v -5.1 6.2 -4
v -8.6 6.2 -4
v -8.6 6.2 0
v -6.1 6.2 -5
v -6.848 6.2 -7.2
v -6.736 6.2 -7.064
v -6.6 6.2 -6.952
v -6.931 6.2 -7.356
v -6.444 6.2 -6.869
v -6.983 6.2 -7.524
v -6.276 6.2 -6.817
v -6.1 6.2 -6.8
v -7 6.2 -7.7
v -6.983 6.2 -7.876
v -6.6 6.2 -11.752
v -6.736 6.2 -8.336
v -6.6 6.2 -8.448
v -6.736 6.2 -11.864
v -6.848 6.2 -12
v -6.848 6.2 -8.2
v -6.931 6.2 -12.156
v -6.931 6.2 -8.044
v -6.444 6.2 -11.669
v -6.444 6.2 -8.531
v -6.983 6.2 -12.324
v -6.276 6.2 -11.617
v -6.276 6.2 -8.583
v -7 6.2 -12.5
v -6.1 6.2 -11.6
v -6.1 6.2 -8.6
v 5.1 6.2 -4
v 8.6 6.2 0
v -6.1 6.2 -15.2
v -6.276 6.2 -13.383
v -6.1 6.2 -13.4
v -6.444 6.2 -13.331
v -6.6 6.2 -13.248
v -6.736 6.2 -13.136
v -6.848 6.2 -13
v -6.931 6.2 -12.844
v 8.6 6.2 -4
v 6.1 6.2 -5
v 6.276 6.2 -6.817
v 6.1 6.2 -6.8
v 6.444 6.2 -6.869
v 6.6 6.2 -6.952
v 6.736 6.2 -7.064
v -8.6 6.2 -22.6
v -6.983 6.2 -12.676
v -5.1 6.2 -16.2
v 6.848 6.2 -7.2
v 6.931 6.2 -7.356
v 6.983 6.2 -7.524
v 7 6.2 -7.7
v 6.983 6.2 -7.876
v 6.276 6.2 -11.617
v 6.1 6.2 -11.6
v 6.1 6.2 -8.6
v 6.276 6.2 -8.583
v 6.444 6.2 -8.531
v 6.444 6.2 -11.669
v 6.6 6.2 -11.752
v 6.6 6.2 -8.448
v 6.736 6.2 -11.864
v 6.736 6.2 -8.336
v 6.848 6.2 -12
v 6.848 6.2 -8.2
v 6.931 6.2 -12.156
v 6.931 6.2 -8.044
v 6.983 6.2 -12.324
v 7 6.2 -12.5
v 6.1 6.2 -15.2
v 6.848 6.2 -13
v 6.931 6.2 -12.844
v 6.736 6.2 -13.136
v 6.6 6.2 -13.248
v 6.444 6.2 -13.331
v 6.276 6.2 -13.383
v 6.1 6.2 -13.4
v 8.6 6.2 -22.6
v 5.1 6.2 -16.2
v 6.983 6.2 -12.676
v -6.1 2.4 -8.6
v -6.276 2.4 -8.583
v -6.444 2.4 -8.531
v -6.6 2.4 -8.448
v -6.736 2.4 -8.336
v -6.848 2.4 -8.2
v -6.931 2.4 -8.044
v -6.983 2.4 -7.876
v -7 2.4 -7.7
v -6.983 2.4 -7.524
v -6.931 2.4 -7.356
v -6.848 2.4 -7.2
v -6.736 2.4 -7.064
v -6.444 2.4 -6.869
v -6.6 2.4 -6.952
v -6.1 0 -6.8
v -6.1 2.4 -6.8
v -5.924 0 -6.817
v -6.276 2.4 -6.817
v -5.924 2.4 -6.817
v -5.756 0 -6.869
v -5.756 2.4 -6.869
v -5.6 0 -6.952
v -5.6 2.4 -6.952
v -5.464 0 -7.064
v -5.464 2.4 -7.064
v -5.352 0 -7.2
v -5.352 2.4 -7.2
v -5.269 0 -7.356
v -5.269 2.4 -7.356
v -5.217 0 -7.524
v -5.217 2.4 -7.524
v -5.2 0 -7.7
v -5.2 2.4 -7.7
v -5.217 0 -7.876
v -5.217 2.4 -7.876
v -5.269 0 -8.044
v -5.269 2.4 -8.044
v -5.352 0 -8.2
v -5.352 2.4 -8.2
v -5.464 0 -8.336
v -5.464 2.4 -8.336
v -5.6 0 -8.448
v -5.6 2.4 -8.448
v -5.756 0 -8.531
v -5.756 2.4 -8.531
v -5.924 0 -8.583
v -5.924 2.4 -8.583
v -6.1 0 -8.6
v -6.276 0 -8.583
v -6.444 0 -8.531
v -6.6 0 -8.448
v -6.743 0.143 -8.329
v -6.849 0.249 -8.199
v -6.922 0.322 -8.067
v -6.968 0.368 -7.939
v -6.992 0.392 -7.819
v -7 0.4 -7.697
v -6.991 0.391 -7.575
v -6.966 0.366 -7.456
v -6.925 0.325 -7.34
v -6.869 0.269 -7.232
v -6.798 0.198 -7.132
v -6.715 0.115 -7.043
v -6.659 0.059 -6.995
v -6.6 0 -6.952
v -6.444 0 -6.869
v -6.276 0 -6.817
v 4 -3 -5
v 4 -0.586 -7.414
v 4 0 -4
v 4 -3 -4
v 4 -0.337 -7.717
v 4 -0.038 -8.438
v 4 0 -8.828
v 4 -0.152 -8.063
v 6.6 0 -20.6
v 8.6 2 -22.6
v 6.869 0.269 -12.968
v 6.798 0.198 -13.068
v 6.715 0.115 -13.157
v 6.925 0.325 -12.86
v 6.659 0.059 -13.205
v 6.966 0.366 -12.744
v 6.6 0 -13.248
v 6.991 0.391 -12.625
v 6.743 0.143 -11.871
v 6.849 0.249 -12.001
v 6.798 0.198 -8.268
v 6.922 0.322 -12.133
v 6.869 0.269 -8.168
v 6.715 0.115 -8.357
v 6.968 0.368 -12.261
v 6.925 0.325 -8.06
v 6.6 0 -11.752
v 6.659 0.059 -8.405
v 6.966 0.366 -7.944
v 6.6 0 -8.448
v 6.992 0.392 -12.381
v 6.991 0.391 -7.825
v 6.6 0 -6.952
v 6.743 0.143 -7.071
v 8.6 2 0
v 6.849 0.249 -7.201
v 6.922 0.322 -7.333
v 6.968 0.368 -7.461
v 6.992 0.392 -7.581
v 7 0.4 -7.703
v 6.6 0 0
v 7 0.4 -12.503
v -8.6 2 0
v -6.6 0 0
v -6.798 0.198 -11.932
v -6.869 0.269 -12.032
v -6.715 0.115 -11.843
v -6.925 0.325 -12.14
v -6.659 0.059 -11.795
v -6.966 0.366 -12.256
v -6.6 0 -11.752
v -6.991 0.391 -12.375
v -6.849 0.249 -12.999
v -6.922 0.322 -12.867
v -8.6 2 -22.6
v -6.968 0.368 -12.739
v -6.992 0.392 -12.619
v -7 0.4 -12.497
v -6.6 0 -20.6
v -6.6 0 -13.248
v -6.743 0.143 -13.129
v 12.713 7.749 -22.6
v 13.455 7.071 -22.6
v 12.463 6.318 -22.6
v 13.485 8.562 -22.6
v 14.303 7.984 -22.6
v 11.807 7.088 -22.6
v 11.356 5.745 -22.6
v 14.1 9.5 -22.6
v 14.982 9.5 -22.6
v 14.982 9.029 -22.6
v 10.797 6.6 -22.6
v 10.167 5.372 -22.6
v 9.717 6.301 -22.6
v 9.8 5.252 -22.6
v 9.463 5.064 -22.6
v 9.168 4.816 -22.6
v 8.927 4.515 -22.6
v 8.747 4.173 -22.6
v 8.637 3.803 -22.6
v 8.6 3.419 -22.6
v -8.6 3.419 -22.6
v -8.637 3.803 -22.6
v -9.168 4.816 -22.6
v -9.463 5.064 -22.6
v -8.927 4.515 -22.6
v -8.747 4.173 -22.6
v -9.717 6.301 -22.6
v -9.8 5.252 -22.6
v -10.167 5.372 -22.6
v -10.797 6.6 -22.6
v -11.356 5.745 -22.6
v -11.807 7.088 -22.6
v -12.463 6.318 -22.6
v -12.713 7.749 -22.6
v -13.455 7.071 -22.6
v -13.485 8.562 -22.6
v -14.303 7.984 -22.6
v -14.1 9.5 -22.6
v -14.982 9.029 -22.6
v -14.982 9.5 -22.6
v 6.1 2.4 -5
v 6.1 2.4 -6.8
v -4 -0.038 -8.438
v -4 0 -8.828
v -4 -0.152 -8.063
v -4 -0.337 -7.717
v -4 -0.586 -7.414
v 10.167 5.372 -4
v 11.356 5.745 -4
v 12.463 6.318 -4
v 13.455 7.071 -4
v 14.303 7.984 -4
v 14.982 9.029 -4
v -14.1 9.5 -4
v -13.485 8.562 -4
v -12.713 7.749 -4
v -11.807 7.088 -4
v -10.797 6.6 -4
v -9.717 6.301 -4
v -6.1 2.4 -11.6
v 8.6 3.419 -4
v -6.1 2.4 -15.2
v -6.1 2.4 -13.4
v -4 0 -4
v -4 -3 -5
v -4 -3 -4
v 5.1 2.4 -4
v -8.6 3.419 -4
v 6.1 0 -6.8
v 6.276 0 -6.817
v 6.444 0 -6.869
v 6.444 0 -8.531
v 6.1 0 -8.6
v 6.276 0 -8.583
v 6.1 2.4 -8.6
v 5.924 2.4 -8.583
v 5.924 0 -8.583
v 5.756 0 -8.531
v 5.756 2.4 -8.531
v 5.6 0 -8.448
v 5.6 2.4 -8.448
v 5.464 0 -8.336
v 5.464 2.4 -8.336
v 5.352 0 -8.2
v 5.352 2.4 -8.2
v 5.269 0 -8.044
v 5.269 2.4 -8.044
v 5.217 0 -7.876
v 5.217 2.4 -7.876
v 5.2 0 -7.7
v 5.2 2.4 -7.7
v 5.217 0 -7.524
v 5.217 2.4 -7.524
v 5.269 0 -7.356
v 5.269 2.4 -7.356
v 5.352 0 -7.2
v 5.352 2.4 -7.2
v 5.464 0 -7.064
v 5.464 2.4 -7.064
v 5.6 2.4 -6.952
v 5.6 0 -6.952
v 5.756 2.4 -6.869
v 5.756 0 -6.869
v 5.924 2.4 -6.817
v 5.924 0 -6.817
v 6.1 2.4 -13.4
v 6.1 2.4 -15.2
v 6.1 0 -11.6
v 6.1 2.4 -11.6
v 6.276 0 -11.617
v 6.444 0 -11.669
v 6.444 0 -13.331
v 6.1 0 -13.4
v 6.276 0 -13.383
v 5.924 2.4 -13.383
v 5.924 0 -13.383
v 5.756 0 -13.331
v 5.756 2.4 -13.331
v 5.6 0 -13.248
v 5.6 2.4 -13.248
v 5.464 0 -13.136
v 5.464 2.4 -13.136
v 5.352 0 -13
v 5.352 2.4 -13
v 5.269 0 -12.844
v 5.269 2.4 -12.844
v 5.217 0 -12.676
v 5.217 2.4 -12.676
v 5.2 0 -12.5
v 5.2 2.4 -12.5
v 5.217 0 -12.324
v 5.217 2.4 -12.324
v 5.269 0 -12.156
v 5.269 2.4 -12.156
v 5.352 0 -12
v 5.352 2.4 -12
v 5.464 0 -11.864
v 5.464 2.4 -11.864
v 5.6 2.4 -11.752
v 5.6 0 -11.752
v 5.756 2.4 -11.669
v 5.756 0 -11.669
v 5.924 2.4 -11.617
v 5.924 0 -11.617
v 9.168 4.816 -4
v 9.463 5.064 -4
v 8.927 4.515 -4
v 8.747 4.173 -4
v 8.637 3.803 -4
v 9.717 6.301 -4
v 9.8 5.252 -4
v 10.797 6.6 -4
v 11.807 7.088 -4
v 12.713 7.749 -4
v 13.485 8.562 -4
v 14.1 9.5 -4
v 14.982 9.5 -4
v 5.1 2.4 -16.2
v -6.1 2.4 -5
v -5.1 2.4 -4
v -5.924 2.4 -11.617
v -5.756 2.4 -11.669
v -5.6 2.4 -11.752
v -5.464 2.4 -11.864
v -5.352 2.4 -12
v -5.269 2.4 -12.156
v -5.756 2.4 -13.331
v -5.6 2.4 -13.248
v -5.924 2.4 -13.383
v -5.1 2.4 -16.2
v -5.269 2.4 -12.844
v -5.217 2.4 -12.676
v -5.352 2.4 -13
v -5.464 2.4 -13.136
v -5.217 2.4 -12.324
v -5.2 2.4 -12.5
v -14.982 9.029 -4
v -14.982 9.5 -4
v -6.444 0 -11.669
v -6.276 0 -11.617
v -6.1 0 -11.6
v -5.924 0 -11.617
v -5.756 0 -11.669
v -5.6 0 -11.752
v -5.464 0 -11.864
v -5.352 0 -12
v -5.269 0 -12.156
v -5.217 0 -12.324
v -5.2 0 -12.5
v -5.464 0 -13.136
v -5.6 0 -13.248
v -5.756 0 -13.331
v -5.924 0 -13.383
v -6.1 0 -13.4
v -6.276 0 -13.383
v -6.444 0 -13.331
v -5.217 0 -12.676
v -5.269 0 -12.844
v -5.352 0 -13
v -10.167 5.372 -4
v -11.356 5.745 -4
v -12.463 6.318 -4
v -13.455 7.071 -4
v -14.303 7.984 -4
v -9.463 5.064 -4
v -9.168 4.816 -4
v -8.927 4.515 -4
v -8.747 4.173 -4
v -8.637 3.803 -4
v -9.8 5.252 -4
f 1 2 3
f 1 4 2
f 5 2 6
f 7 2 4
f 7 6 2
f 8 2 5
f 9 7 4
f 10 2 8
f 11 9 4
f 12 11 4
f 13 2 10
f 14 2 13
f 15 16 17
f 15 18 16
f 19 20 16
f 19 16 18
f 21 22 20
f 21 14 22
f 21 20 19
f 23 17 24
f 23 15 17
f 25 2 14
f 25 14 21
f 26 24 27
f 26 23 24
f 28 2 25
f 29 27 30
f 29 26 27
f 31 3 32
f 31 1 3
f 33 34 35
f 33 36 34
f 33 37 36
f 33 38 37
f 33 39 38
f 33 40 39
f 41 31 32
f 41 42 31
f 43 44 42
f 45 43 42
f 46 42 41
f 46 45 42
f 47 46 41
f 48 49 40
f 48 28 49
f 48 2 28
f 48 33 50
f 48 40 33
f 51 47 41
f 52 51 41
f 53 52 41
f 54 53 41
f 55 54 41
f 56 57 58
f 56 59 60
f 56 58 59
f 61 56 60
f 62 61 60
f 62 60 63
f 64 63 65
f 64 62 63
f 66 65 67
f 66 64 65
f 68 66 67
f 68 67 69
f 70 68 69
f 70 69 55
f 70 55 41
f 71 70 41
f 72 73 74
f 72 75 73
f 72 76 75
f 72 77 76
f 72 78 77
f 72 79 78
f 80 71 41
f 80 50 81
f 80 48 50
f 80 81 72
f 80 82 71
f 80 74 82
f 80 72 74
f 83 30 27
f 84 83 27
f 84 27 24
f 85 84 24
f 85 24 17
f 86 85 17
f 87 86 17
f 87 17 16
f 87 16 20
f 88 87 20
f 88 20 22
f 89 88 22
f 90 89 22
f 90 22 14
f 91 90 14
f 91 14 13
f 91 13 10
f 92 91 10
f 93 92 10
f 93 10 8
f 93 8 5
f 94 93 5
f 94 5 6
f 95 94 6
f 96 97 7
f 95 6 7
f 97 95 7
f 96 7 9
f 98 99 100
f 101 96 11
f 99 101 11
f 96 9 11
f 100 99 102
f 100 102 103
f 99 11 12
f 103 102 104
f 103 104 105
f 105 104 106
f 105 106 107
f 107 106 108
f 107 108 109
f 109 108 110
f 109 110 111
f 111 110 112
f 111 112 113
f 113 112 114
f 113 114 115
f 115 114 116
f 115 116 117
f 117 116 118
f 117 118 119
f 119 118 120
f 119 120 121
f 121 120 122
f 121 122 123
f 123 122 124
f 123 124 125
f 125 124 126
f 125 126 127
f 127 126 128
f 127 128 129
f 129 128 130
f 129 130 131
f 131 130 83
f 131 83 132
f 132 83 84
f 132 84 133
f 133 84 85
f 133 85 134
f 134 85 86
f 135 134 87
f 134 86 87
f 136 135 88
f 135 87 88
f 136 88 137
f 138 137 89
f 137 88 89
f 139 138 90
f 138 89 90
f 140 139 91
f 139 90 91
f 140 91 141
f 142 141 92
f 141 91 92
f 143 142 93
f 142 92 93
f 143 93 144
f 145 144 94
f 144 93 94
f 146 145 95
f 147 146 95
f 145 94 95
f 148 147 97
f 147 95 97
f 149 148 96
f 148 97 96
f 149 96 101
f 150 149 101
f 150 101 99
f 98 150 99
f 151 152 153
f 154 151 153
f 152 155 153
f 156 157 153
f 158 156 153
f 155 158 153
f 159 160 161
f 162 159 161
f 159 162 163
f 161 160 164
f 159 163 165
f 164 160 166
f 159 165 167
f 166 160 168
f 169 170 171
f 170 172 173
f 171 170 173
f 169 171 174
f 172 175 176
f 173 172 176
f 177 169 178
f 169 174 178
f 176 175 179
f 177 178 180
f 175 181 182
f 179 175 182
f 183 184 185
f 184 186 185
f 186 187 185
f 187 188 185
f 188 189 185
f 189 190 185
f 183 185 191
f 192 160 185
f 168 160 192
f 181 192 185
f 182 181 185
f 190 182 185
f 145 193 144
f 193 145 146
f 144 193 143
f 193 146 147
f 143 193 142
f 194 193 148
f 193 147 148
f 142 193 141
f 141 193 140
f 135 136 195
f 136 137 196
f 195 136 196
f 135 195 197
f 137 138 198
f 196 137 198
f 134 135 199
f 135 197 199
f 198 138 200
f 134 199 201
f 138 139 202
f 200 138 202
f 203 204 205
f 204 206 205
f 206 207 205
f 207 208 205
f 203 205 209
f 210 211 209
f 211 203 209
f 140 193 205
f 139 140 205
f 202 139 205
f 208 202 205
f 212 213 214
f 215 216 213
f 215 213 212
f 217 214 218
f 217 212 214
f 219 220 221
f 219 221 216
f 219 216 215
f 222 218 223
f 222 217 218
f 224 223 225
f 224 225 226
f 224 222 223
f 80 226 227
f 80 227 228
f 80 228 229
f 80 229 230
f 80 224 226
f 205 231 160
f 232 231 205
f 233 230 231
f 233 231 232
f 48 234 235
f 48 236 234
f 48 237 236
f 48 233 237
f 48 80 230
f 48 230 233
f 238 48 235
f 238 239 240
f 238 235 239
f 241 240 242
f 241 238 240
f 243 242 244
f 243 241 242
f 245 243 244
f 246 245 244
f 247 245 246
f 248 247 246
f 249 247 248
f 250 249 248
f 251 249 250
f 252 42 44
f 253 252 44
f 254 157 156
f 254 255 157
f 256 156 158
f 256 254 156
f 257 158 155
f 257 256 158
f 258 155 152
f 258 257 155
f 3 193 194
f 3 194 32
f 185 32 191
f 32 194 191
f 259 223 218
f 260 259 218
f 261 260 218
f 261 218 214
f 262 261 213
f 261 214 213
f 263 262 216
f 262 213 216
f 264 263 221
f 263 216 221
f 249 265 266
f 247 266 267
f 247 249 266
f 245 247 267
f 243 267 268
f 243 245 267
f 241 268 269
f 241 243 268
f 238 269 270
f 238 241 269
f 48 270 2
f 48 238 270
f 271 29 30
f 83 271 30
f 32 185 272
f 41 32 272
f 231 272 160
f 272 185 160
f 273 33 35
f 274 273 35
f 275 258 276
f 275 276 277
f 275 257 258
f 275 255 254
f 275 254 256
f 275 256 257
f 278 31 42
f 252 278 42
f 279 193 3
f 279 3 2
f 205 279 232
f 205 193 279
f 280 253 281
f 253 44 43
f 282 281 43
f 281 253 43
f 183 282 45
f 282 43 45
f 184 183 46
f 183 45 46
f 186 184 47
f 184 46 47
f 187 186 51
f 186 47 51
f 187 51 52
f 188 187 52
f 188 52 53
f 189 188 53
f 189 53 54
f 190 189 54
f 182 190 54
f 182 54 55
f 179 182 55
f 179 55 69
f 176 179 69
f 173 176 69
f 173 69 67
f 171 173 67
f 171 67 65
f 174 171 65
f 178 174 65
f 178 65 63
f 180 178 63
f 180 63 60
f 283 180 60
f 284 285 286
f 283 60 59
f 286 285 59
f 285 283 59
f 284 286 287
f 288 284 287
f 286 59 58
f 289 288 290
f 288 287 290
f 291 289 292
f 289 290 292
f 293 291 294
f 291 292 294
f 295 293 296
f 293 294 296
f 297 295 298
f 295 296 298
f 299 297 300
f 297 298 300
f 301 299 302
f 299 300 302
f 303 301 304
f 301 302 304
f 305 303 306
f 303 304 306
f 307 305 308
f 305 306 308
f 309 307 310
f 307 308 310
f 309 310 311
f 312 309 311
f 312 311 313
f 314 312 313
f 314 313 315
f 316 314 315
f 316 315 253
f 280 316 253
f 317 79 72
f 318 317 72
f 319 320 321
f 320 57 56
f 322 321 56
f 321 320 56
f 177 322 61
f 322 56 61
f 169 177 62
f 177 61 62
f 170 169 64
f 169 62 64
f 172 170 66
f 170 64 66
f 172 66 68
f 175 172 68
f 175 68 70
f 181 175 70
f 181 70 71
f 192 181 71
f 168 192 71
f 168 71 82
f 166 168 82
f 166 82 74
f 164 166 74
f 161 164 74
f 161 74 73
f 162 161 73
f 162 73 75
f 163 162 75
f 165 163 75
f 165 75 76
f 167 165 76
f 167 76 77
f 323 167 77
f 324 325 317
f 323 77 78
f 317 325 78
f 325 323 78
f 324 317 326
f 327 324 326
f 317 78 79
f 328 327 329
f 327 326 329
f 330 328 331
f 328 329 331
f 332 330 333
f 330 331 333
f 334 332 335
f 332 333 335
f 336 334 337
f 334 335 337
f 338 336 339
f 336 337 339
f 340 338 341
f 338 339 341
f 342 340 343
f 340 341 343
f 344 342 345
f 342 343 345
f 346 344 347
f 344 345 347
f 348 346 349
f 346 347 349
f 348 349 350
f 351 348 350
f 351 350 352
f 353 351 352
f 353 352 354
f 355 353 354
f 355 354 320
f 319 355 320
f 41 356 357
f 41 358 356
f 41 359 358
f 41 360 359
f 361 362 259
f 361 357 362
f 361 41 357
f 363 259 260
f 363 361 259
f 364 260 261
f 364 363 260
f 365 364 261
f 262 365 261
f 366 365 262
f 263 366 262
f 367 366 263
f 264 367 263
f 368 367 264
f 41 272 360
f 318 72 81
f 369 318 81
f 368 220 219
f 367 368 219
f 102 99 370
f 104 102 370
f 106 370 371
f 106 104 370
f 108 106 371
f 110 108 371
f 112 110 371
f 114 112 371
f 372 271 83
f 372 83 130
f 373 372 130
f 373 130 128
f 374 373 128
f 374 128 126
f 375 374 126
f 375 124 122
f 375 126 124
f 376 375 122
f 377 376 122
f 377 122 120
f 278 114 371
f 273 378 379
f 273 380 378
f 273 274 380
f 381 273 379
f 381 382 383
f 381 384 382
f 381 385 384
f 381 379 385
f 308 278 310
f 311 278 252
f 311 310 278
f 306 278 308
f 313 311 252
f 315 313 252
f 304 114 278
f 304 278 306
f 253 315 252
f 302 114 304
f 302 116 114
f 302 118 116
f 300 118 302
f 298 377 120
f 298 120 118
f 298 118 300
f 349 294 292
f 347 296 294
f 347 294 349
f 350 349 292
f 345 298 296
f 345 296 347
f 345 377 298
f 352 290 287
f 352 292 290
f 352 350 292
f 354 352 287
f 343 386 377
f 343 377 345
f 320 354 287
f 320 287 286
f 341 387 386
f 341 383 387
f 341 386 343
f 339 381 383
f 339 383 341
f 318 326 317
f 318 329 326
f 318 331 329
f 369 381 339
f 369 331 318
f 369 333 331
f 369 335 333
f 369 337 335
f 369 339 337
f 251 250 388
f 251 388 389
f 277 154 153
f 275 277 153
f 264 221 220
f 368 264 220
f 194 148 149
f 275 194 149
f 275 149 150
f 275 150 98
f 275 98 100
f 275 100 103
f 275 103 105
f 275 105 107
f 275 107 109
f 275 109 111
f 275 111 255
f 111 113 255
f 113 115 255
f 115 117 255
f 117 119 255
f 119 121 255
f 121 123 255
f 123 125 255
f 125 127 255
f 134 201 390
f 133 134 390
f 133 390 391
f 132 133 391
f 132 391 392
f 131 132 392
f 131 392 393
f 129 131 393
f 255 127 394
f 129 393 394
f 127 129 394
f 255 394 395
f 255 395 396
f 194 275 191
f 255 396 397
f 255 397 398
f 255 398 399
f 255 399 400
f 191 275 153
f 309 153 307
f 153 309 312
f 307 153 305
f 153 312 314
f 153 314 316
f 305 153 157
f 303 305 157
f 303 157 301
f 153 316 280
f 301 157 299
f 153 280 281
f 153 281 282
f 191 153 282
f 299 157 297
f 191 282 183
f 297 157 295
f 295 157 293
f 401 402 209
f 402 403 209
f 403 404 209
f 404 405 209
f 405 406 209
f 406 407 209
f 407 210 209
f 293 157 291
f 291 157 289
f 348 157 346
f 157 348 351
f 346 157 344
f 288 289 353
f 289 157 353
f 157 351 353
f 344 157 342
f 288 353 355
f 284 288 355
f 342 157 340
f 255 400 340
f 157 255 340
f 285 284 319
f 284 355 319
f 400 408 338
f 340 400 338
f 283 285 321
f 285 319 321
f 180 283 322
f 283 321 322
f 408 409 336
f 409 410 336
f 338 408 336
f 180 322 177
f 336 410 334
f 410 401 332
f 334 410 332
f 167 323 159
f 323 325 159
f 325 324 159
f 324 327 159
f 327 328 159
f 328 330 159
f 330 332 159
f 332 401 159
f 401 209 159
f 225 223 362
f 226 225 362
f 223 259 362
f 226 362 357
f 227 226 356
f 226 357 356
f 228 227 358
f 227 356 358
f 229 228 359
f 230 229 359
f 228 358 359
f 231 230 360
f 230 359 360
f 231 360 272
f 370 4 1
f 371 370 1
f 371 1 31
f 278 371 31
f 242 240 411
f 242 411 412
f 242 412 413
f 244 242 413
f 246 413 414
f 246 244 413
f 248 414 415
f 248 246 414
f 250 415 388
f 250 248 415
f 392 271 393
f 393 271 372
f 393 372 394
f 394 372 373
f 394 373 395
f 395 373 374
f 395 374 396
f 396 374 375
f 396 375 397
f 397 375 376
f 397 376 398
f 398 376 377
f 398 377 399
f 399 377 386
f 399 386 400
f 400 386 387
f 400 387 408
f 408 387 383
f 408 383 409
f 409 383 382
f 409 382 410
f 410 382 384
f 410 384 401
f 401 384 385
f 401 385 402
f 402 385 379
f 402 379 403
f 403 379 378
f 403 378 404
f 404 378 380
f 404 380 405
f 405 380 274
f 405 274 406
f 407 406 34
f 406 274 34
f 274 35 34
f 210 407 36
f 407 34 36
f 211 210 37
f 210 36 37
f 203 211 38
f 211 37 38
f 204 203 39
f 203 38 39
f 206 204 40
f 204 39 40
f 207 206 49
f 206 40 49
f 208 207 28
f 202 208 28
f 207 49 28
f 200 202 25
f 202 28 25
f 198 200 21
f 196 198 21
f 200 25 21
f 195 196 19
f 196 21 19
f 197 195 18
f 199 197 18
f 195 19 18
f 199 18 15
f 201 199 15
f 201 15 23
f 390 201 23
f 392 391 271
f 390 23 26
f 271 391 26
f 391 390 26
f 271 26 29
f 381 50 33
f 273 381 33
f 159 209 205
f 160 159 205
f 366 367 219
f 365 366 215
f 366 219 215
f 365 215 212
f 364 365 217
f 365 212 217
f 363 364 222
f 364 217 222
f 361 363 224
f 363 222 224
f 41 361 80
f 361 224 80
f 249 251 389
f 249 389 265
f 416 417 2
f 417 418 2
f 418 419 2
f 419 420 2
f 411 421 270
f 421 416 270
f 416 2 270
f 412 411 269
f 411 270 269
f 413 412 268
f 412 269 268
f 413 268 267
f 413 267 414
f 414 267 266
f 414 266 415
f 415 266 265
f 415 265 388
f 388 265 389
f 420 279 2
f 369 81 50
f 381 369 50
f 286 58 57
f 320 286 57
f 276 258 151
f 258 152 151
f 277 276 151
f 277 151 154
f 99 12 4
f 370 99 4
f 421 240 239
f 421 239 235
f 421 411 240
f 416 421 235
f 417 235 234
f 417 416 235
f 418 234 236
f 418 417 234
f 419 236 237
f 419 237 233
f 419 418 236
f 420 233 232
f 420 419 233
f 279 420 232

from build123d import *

# Parameters (mm, degrees)
ESQUISSE1_W             = 17.2
ESQUISSE1_H             = 22.6
BOSS_EXTRU_1_DEPTH      = 6.2
ENL_V_MAT_EXTRU_1_DEPTH = 3.8
ESQUISSE3_R             = 0.9
ENL_V_MAT_EXTRU_2_DEPTH = 25.477744994
CHANFREIN1_SIZE         = 2
BOSS_EXTRU_2_DEPTH      = 18.6
BOSS_EXTRU_3_DEPTH      = 4
CONG_1_R                = 2


with BuildPart() as part:
    # Esquisse1 → Boss.-Extru.1 (new body)
    with BuildSketch(Plane(origin=(0, 0, 0), x_dir=(1, 0, 0), z_dir=(0, 1, 0))):
        with Locations((0, 11.3)):
            Rectangle(ESQUISSE1_W, ESQUISSE1_H)
    extrude(amount=BOSS_EXTRU_1_DEPTH)

    # Esquisse2 → Enlèv. mat.-Extru.1 (cut)
    with BuildSketch(Plane(origin=(0, 6.2, 0), x_dir=(1, 0, 0), z_dir=(0, 1, 0))):
        with BuildLine():
            Line((-5.1, 4), (5.1, 4))
            Line((5.1, 4), (6.1, 5))
            Line((6.1, 5), (6.1, 6.8))
            ThreePointArc((6.1, 6.8), (7, 7.7), (6.1, 8.6))
            Line((6.1, 8.6), (6.1, 11.6))
            ThreePointArc((6.1, 11.6), (7, 12.5), (6.1, 13.4))
            Line((6.1, 13.4), (6.1, 15.2))
            Line((6.1, 15.2), (5.1, 16.2))
            Line((5.1, 16.2), (-5.1, 16.2))
            Line((-5.1, 16.2), (-6.1, 15.2))
            Line((-6.1, 15.2), (-6.1, 13.4))
            ThreePointArc((-6.1, 13.4), (-7, 12.5), (-6.1, 11.6))
            Line((-6.1, 11.6), (-6.1, 8.6))
            ThreePointArc((-6.1, 8.6), (-7, 7.7), (-6.1, 6.8))
            Line((-6.1, 6.8), (-6.1, 5))
            Line((-6.1, 5), (-5.1, 4))
        make_face()
    extrude(amount=-ENL_V_MAT_EXTRU_1_DEPTH, mode=Mode.SUBTRACT)

    # Esquisse3 → Enlèv. mat.-Extru.2 (cut, through all)
    with BuildSketch(Plane(origin=(0, 2.4, 0), x_dir=(1, 0, 0), z_dir=(0, 1, 0))):
        with Locations(Location((6.1, 12.5, 0), (0, 0, 270))):
            Circle(ESQUISSE3_R)
        with Locations(Location((-6.1, 12.5, 0), (0, 0, 270))):
            Circle(ESQUISSE3_R)
        with Locations(Location((-6.1, 7.7, 0), (0, 0, 270))):
            Circle(ESQUISSE3_R)
        with Locations(Location((6.1, 7.7, 0), (0, 0, 270))):
            Circle(ESQUISSE3_R)
    extrude(amount=-ENL_V_MAT_EXTRU_2_DEPTH, mode=Mode.SUBTRACT)

    # Chanfrein1
    # the kernel refuses this chamfer: 2 mm, written as the material it takes off along each edge
    with BuildSketch(Plane(origin=(13.743365976, 0, -22.6), x_dir=(0, -0.02749587661058639, 0.9996219169112968), z_dir=(-1, 0, 0))) as chanfrein1_piece_1:
        Polygon((CHANFREIN1_SIZE * 0.999621916911, CHANFREIN1_SIZE * 0.0274958766106), (-CHANFREIN1_SIZE * 0.0274958766106, CHANFREIN1_SIZE * 0.999621916911), (0, 0), align=None)
    extrude(amount=27.486731952, mode=Mode.SUBTRACT)
    with BuildSketch(Plane(origin=(8.6, 0, 5.143365976), x_dir=(0.027495876610586494, 0.9996219169112968, 0), z_dir=(0, 0, -1)), Plane(origin=(-8.6, 0, -27.743365976), x_dir=(-0.027495876610586494, 0.9996219169112968, 0), z_dir=(0, 0, 1))) as chanfrein1_piece_2:
        Polygon((CHANFREIN1_SIZE * 0.999621916911, -CHANFREIN1_SIZE * 0.0274958766106), (-CHANFREIN1_SIZE * 0.0274958766106, -CHANFREIN1_SIZE * 0.999621916911), (0, 0), align=None)
    extrude(amount=32.886731952, mode=Mode.SUBTRACT)

    # Esquisse4 → Boss.-Extru.2 (add)
    with BuildSketch(Plane(origin=(0, 0, -22.6), x_dir=(-1, 0, 0), z_dir=(0, 0, -1))):
        with BuildLine():
            Line((-8.6, 6.2), (-8.6, 5.2))
            ThreePointArc((-8.6, 5.2), (-12.321519298, 6.230801171), (-14.982352941, 9.029411765))
            Line((-14.982352941, 9.029411765), (-14.982352941, 9.5))
            Line((-14.982352941, 9.5), (-14.1, 9.5))
            ThreePointArc((-14.1, 9.5), (-11.807023542, 7.088294096), (-8.6, 6.2))
        make_face()
    boss_extru_2 = extrude(amount=-BOSS_EXTRU_2_DEPTH)

    # Symétrie1: Boss.-Extru.2 across plane
    add(boss_extru_2.mirror(Plane(origin=(0, 0, 0), x_dir=(0, 0, 1), z_dir=(1, 0, 0))))

    # Esquisse5 → Boss.-Extru.3 (add, symmetric)
    with BuildSketch(Plane(origin=(0, 0, 0), x_dir=(0, 0, -1), z_dir=(1, 0, 0))):
        Polygon((4, 0), (8, 0), (5, -3), (4, -3), align=None)
    extrude(amount=BOSS_EXTRU_3_DEPTH, both=True)

    # Congé1
    cong_1_edges = [part.edges().sort_by_distance(p)[0] for p in [
        (8.6, 5.2, -13.3),
        (-8.6, 5.2, -13.3),
        (0, 0, -8),
    ]]
    fillet(cong_1_edges, radius=CONG_1_R)


solid = part.part
